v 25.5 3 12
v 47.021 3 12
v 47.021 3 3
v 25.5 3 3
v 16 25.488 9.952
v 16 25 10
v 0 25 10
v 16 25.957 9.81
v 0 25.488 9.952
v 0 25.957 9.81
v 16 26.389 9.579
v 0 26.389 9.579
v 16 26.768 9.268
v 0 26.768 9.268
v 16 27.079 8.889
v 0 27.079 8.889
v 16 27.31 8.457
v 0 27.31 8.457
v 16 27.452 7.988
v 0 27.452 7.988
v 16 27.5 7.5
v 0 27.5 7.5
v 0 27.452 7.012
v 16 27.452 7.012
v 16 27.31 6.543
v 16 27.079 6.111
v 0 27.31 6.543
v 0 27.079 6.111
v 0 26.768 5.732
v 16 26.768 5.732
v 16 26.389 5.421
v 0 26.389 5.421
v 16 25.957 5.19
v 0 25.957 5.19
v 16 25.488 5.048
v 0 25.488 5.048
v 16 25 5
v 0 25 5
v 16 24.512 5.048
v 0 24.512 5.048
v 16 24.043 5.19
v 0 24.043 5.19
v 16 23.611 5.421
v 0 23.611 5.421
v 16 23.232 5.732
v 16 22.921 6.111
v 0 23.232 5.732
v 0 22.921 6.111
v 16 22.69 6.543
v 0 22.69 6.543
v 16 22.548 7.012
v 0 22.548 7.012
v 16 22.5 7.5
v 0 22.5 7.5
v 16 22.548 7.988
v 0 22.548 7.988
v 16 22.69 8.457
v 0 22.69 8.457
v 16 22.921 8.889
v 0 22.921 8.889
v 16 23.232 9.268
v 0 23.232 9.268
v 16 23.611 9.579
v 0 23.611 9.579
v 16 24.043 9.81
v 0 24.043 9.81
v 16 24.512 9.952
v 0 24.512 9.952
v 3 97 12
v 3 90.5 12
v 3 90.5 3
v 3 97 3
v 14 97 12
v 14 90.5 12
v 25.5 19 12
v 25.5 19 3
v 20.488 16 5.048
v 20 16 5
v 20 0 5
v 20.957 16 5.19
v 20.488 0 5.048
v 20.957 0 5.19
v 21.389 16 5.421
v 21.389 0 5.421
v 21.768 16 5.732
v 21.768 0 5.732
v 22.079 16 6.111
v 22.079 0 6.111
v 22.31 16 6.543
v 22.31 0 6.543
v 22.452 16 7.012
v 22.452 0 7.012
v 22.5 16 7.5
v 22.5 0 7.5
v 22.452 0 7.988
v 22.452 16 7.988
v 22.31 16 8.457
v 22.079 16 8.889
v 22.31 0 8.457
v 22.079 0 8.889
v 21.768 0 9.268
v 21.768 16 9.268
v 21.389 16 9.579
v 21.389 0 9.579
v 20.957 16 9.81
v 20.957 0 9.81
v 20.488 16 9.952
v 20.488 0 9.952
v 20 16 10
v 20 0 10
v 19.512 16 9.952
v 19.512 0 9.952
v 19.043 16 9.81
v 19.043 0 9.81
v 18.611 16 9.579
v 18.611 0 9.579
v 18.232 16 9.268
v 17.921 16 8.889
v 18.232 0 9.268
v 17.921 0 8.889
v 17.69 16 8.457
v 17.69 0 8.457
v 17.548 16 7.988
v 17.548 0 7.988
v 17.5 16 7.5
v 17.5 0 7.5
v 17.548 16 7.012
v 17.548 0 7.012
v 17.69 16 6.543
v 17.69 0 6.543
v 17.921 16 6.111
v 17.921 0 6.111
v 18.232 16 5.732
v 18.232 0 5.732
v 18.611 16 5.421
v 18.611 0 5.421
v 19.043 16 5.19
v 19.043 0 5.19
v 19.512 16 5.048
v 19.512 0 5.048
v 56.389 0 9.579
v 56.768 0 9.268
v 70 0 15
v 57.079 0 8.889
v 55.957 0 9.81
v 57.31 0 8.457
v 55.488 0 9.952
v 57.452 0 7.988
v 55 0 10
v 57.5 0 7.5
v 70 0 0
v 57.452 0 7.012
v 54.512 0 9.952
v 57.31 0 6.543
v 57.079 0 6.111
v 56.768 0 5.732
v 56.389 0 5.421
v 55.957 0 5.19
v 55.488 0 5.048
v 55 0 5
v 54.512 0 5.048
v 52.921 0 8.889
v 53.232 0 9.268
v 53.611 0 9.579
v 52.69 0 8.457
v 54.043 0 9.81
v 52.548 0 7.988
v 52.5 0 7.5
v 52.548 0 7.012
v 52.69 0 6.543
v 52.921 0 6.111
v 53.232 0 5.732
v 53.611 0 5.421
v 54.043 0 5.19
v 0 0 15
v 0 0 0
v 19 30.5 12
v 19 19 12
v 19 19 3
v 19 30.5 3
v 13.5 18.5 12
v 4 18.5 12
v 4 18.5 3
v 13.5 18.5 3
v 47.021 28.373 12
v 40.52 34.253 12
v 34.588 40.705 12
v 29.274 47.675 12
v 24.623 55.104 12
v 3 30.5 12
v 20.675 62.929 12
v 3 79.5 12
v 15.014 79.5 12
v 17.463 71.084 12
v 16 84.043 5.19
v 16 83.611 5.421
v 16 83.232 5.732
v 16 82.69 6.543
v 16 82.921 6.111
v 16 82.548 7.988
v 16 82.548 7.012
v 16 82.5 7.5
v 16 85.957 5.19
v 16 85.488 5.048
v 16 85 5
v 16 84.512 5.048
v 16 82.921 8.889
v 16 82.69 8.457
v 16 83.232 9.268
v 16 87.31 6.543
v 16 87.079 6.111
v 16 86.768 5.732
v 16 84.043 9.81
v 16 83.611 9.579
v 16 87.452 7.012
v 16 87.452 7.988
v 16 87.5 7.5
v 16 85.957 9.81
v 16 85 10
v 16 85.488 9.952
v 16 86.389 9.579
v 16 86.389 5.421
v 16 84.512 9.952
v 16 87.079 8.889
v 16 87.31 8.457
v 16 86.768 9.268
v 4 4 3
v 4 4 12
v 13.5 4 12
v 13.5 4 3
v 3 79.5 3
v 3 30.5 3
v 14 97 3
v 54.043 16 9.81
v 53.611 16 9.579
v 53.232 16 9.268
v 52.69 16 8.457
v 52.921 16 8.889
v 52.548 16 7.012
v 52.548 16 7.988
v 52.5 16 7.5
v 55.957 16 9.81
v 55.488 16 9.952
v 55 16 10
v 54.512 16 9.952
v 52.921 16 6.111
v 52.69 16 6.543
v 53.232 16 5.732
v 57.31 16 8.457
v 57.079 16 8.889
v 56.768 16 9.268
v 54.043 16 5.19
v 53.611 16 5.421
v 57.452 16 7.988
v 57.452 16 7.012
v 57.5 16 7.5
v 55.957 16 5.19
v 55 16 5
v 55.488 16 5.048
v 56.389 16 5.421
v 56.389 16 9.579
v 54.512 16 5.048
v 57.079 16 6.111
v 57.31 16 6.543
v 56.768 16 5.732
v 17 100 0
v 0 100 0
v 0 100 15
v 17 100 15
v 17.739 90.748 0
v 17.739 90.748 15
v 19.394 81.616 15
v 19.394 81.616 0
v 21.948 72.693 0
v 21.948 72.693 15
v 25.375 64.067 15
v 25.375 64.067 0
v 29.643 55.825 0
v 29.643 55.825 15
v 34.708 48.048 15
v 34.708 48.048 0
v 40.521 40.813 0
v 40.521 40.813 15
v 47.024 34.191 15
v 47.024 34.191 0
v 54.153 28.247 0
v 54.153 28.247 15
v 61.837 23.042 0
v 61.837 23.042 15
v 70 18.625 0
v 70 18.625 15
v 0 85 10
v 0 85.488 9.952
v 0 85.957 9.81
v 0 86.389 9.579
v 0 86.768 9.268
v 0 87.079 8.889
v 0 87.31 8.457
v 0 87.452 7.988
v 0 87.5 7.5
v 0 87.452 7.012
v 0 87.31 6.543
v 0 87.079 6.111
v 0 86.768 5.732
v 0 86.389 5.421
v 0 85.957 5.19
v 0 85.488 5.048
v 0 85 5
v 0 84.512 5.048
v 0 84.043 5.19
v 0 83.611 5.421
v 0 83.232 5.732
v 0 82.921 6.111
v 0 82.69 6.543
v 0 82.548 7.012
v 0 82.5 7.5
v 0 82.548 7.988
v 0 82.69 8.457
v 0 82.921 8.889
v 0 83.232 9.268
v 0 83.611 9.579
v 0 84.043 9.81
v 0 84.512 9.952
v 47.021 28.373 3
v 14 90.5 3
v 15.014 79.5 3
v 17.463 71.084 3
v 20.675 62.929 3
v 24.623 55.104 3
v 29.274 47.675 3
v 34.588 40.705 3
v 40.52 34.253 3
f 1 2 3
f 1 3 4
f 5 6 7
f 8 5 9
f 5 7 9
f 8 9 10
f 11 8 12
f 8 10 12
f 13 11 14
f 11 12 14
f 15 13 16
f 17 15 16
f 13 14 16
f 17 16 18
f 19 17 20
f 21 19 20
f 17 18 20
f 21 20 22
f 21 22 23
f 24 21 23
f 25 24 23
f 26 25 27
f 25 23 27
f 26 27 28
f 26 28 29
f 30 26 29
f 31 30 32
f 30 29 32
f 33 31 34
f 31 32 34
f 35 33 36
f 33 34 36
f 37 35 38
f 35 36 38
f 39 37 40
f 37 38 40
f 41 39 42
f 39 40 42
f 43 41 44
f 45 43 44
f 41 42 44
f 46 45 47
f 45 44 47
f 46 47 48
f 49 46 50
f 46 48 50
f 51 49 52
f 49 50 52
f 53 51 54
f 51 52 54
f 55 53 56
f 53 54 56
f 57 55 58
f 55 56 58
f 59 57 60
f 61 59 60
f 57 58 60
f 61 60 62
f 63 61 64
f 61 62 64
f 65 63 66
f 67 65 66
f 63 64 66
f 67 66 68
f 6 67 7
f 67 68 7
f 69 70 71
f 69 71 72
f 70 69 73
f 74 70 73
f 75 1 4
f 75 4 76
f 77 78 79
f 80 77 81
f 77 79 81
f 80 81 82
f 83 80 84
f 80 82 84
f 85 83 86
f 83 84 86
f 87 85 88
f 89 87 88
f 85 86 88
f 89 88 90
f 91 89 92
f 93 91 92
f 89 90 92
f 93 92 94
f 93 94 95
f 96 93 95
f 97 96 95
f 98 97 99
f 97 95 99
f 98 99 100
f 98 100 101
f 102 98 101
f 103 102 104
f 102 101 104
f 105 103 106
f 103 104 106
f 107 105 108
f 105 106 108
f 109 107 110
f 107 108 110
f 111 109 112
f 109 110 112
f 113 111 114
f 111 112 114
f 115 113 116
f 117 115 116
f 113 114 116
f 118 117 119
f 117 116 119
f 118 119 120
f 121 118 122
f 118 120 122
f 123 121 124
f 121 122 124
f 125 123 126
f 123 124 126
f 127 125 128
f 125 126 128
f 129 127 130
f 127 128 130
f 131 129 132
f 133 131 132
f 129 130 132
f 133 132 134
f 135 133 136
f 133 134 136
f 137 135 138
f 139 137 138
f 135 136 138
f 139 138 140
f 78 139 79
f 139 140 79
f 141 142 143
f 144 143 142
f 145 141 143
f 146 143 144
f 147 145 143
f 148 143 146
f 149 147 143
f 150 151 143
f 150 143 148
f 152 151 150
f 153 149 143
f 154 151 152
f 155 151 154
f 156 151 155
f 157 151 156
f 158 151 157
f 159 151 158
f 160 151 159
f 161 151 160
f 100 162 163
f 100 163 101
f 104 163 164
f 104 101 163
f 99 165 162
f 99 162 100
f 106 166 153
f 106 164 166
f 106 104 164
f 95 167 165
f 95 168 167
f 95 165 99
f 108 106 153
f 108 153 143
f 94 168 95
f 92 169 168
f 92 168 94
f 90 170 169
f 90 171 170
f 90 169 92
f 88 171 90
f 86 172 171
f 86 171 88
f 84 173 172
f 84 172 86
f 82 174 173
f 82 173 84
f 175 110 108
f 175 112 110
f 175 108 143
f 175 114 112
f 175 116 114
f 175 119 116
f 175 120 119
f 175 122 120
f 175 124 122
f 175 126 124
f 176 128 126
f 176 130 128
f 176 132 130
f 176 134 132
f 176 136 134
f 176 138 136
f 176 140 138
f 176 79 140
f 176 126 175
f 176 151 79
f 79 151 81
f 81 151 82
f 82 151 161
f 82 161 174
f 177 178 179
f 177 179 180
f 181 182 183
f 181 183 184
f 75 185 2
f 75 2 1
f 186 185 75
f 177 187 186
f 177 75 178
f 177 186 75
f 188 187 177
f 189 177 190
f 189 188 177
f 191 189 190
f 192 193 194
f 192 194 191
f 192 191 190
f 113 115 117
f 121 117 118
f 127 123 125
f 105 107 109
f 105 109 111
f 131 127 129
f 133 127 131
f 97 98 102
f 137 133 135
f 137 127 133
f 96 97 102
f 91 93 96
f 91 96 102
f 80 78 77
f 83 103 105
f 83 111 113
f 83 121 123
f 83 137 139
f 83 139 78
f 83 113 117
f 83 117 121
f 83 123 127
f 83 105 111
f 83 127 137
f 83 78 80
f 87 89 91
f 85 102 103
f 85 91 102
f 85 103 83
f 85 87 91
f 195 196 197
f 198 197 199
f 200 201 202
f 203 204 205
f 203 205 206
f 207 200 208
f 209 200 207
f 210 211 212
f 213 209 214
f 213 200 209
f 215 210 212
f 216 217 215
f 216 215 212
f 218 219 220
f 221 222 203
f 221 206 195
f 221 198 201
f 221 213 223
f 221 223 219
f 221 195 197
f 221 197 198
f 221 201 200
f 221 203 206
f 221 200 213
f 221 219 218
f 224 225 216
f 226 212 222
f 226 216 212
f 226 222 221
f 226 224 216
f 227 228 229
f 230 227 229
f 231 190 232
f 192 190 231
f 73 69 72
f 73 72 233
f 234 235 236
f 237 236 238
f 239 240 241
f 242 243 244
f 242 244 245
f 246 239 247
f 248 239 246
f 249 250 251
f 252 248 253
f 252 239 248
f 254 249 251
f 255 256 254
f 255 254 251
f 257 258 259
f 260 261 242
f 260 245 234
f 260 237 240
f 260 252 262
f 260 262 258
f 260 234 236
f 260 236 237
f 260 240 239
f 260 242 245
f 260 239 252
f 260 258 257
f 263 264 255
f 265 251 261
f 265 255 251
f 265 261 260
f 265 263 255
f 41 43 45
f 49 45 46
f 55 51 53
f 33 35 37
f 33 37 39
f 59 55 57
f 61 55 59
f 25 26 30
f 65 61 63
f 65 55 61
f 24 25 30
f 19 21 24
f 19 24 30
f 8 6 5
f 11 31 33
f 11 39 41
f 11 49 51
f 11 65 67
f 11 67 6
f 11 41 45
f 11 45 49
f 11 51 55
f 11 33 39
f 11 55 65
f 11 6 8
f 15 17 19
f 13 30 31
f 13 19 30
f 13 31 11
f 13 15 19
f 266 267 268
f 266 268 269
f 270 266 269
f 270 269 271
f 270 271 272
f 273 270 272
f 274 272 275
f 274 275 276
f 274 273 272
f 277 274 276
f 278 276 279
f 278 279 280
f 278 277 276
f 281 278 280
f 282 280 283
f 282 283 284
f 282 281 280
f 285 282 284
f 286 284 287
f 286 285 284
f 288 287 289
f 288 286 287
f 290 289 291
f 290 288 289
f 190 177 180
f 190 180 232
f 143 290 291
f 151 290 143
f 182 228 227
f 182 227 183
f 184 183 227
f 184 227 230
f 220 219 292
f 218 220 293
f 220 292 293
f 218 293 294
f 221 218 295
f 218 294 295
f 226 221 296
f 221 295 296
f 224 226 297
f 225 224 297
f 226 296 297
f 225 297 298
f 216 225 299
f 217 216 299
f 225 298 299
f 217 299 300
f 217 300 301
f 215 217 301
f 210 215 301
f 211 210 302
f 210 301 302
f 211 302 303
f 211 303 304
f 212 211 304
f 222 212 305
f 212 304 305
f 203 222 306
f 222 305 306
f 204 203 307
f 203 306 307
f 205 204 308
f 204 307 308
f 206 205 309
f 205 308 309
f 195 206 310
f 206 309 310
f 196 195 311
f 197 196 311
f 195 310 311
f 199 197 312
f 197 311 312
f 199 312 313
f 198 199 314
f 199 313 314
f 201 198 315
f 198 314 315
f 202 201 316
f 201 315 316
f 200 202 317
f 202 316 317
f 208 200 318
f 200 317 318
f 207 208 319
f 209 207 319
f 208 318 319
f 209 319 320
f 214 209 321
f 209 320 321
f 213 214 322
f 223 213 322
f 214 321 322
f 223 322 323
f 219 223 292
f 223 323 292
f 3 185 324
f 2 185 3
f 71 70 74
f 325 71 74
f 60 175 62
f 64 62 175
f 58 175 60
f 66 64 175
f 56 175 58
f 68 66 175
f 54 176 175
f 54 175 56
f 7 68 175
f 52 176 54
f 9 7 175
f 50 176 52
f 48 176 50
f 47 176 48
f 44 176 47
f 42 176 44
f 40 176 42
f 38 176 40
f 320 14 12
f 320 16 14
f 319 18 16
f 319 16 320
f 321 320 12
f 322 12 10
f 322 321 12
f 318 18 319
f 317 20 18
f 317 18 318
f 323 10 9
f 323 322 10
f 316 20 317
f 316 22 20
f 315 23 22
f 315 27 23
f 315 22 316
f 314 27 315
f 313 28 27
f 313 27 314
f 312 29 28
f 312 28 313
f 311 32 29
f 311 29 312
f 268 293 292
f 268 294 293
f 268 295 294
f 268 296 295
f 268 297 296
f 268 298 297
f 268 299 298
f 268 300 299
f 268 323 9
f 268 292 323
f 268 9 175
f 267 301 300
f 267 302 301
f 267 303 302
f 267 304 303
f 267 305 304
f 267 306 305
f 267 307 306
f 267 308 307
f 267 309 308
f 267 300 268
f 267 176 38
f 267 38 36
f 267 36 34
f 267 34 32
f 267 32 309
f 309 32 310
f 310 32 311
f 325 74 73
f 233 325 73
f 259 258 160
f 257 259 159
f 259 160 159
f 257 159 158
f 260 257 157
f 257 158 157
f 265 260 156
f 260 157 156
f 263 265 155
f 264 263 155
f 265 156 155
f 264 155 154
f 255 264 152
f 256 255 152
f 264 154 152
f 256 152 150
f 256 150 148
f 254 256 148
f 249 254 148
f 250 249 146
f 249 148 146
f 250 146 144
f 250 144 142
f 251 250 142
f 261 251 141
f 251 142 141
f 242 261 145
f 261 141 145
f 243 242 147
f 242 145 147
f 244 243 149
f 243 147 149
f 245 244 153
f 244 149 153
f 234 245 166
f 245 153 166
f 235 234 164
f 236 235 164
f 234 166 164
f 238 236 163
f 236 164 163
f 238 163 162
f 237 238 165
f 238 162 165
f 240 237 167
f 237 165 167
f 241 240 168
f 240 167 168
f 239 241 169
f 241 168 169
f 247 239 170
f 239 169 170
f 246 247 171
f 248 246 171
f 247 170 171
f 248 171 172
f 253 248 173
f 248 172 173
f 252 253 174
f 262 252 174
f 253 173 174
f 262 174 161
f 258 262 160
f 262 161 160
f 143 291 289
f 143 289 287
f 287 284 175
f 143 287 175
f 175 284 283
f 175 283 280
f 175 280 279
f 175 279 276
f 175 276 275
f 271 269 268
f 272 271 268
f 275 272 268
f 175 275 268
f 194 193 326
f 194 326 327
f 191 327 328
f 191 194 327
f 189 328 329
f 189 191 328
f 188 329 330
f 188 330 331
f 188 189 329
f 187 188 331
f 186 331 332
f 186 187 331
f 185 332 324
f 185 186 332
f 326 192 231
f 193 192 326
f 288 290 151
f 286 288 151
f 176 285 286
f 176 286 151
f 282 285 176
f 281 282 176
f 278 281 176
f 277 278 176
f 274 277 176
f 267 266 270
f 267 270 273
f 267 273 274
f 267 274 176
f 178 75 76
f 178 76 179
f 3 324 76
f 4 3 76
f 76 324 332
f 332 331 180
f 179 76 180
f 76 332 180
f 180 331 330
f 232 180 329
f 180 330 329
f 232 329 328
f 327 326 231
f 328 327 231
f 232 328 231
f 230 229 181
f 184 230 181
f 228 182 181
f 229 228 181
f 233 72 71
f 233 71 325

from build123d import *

# Parameters (mm, degrees)
BOSS_EXTRU_1_DEPTH      = 15
ESQUISSE7_R             = 2.5
ENL_V_MAT_EXTRU_4_DEPTH = 16
ESQUISSE5_R             = 2.5
ENL_V_MAT_EXTRU_5_DEPTH = 16
ESQUISSE8_R             = 2.5
ENL_V_MAT_EXTRU_6_DEPTH = 16
ESQUISSE9_R             = 2.5
ENL_V_MAT_EXTRU_7_DEPTH = 16
ENL_V_START             = -3
ESQUISSE10_W            = 11
ESQUISSE10_H            = 6.5
ESQUISSE10_W_2          = 9.5
ESQUISSE10_H_2          = 14.5
ENL_V_MAT_EXTRU_8_DEPTH = 9


with BuildPart() as part:
    # Esquisse1 → Boss.-Extru.1 (new body)
    with BuildSketch(Plane.XY):
        with BuildLine():
            Line((0, 100), (17, 100))
            ThreePointArc((17, 100), (32.078733461, 51.873825012), (70, 18.625148861))
            Line((70, 18.625148861), (70, 0))
            Line((70, 0), (0, 0))
            Line((0, 0), (0, 100))
        make_face()
    extrude(amount=BOSS_EXTRU_1_DEPTH)

    # Esquisse7 → Enlèv. mat.-Extru.4 (cut)
    with BuildSketch(Plane.ZY):
        with Locations((7.5, 25)):
            Circle(ESQUISSE7_R)
    extrude(amount=-ENL_V_MAT_EXTRU_4_DEPTH, mode=Mode.SUBTRACT)

    # Esquisse5 → Enlèv. mat.-Extru.5 (cut)
    with BuildSketch(Plane.ZY):
        with Locations((7.5, 85)):
            Circle(ESQUISSE5_R)
    extrude(amount=-ENL_V_MAT_EXTRU_5_DEPTH, mode=Mode.SUBTRACT)

    # Esquisse8 → Enlèv. mat.-Extru.6 (cut)
    with BuildSketch(Plane.XZ):
        with Locations(Location((20, 7.5, 0), (0, 0, 270))):
            Circle(ESQUISSE8_R)
    extrude(amount=-ENL_V_MAT_EXTRU_6_DEPTH, mode=Mode.SUBTRACT)

    # Esquisse9 → Enlèv. mat.-Extru.7 (cut)
    with BuildSketch(Plane.XZ):
        with Locations(Location((55, 7.5, 0), (0, 0, 270))):
            Circle(ESQUISSE9_R)
    extrude(amount=-ENL_V_MAT_EXTRU_7_DEPTH, mode=Mode.SUBTRACT)

    # Esquisse10 → Enlèv. mat.-Extru.8 (cut)
    with BuildSketch(Plane.XY.offset(15).offset(ENL_V_START)):
        with BuildLine():
            Line((3, 79.5), (15.014172538, 79.5))
            ThreePointArc((15.014172538, 79.5), (26.862682219, 51.335667796), (47.020836751, 28.373403185))
            Line((47.020836751, 28.373403185), (47.020836751, 22.591228546))
            Line((47.020836751, 22.591228546), (47.020836751, 18.330678811))
            Line((47.020836751, 18.330678811), (47.020836751, 3))
            Line((47.020836751, 3), (25.5, 3))
            Line((25.5, 3), (25.5, 14.739450265))
            Line((25.5, 14.739450265), (25.5, 19))
            Line((25.5, 19), (19, 19))
            Line((19, 19), (19, 30.5))
            Line((19, 30.5), (3, 30.5))
            Line((3, 30.5), (3, 79.5))
        make_face()
        with Locations((8.5, 93.75)):
            Rectangle(ESQUISSE10_W, ESQUISSE10_H)
        with Locations((8.75, 11.25)):
            Rectangle(ESQUISSE10_W_2, ESQUISSE10_H_2)
    extrude(amount=-ENL_V_MAT_EXTRU_8_DEPTH, mode=Mode.SUBTRACT)


solid = part.part
